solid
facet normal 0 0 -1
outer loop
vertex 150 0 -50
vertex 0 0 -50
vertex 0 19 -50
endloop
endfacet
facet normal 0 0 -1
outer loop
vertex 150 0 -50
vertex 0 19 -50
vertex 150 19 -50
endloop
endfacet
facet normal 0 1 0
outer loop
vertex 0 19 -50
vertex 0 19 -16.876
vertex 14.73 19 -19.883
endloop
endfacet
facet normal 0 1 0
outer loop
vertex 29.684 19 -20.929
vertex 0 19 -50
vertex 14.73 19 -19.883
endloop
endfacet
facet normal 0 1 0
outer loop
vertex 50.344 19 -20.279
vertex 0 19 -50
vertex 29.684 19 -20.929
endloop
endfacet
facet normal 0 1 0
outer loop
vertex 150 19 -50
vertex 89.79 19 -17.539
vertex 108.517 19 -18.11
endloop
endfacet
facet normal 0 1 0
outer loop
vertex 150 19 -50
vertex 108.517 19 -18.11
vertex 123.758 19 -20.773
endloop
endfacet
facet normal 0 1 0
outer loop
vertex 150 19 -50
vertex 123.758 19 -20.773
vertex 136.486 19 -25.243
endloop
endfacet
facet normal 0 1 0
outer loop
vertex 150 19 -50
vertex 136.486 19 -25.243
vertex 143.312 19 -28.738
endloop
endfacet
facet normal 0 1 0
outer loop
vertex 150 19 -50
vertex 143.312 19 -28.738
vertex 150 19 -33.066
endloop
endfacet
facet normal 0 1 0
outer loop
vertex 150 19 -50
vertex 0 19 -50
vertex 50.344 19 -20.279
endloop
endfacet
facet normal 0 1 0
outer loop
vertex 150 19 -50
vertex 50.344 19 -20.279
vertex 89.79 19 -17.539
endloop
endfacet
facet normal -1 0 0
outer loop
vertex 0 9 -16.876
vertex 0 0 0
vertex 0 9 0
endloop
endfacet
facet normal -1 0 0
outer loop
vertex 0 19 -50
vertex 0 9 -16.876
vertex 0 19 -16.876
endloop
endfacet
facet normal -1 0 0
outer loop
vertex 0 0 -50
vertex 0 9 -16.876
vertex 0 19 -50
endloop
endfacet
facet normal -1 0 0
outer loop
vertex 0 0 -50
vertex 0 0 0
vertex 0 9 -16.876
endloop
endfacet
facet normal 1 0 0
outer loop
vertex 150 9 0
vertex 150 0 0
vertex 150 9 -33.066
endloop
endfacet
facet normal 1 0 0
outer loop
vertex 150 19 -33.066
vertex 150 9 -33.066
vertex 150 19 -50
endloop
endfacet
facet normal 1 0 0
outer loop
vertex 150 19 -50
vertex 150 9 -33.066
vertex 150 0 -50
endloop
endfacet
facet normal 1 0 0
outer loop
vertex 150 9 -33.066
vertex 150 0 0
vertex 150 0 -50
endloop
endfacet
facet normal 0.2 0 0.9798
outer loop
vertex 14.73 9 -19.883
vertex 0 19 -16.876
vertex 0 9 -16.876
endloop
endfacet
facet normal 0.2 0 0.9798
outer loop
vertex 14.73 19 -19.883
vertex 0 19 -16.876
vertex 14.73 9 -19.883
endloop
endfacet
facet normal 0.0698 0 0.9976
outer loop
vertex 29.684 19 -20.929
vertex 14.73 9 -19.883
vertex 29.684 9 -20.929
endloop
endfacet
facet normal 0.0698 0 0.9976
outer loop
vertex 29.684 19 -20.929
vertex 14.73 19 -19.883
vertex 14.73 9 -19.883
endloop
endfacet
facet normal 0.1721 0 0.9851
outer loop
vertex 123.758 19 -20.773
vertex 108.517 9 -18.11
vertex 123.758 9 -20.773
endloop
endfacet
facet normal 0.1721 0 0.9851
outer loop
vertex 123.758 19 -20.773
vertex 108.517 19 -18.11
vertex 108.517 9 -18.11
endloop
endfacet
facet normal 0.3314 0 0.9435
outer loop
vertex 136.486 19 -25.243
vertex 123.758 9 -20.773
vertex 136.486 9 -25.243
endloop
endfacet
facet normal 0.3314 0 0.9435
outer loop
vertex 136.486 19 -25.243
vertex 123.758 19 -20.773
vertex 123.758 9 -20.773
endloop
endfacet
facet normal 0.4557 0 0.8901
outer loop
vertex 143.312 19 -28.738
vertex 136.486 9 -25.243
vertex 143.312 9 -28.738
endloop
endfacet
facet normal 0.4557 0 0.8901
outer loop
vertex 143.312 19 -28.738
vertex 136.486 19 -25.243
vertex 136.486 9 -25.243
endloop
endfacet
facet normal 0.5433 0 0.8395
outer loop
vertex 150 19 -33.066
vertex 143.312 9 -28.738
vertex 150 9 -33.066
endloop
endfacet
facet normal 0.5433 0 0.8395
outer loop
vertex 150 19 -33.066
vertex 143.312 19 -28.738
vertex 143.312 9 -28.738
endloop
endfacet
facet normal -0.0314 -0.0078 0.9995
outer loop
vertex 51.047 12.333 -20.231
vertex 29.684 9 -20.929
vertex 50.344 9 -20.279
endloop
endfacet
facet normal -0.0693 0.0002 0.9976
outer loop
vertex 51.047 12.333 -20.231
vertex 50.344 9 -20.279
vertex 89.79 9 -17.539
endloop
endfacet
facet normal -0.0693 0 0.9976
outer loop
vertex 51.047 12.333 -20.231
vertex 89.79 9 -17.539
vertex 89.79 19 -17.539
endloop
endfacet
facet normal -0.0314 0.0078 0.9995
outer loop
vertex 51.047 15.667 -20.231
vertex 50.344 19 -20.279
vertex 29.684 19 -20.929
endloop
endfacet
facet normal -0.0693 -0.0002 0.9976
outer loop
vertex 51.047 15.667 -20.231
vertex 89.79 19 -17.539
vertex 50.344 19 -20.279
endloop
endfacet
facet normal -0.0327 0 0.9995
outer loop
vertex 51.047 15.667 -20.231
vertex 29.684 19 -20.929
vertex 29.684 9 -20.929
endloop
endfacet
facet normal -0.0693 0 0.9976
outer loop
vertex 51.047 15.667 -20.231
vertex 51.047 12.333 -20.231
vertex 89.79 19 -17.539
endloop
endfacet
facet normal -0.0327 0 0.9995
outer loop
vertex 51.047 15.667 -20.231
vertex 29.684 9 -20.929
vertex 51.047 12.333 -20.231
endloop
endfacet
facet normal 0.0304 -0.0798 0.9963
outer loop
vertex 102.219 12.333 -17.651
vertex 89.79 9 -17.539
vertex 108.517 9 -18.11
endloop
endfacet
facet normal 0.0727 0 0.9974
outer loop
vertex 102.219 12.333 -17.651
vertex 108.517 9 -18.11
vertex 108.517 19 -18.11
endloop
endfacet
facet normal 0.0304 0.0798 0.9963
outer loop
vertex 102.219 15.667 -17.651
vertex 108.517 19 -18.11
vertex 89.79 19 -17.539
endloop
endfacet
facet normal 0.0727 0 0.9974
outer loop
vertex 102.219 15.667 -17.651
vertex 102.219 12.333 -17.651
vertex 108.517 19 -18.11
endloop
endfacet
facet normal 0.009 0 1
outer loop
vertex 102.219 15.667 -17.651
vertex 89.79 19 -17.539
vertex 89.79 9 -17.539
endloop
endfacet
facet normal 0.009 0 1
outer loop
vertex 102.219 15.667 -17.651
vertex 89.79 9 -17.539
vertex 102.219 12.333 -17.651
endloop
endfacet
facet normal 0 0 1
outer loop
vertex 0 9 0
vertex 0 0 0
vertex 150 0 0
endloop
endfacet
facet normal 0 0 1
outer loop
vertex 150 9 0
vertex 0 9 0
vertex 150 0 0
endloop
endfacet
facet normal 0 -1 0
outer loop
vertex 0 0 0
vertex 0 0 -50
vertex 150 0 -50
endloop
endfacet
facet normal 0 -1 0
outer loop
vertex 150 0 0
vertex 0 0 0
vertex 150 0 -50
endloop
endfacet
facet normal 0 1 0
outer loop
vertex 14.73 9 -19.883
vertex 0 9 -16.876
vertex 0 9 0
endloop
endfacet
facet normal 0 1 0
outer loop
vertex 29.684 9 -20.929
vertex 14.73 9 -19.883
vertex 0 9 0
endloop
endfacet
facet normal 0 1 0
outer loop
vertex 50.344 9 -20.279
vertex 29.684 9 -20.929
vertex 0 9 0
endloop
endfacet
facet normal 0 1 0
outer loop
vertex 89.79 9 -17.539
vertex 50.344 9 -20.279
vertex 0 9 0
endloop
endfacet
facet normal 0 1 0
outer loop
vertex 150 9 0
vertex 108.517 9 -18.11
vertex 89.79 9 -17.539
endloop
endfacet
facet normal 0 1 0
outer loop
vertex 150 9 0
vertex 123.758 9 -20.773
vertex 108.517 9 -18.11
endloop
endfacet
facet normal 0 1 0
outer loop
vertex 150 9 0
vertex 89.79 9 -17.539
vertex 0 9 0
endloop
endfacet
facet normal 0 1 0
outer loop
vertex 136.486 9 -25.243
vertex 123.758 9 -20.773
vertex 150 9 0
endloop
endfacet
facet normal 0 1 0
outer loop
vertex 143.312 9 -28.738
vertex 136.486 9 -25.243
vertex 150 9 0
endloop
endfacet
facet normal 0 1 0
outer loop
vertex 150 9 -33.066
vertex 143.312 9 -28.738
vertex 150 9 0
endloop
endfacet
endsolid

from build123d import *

# Parameters (mm, degrees)
SKETCH1_W           = 150
SKETCH1_H           = 50
BOSS_EXTRUDE1_DEPTH = 19
CUT_EXTRUDE1_DEPTH  = 10


with BuildPart() as part:
    # Sketch1 → Boss-Extrude1 (new body)
    with BuildSketch(Plane(origin=(0, 0, 0), x_dir=(1, 0, 0), z_dir=(0, 1, 0))):
        with Locations((75, 25)):
            Rectangle(SKETCH1_W, SKETCH1_H)
    extrude(amount=BOSS_EXTRUDE1_DEPTH)

    # Sketch2 → Cut-Extrude1 (cut)
    with BuildSketch(Plane(origin=(0, 19, 0), x_dir=(1, 0, 0), z_dir=(0, 1, 0))):
        with BuildLine():
            Line((-14.15766915, 11.43597738), (-14.15766915, -14.105632465))
            Line((-14.15766915, -14.105632465), (161.61937252, -14.105632465))
            Line((161.61937252, -14.105632465), (161.61937252, 43.164685263))
            add(Edge.make_bspline(
                [(-14.15766915, 11.43597738), (43.406827576, 39.699894181), (110.750368018, -9.289380037), (161.61937252, 43.164685263)],
                knots=[0, 0, 0, 0, 1, 1, 1, 1], degree=3))
        make_face()
    extrude(amount=-CUT_EXTRUDE1_DEPTH, mode=Mode.SUBTRACT)


solid = part.part
